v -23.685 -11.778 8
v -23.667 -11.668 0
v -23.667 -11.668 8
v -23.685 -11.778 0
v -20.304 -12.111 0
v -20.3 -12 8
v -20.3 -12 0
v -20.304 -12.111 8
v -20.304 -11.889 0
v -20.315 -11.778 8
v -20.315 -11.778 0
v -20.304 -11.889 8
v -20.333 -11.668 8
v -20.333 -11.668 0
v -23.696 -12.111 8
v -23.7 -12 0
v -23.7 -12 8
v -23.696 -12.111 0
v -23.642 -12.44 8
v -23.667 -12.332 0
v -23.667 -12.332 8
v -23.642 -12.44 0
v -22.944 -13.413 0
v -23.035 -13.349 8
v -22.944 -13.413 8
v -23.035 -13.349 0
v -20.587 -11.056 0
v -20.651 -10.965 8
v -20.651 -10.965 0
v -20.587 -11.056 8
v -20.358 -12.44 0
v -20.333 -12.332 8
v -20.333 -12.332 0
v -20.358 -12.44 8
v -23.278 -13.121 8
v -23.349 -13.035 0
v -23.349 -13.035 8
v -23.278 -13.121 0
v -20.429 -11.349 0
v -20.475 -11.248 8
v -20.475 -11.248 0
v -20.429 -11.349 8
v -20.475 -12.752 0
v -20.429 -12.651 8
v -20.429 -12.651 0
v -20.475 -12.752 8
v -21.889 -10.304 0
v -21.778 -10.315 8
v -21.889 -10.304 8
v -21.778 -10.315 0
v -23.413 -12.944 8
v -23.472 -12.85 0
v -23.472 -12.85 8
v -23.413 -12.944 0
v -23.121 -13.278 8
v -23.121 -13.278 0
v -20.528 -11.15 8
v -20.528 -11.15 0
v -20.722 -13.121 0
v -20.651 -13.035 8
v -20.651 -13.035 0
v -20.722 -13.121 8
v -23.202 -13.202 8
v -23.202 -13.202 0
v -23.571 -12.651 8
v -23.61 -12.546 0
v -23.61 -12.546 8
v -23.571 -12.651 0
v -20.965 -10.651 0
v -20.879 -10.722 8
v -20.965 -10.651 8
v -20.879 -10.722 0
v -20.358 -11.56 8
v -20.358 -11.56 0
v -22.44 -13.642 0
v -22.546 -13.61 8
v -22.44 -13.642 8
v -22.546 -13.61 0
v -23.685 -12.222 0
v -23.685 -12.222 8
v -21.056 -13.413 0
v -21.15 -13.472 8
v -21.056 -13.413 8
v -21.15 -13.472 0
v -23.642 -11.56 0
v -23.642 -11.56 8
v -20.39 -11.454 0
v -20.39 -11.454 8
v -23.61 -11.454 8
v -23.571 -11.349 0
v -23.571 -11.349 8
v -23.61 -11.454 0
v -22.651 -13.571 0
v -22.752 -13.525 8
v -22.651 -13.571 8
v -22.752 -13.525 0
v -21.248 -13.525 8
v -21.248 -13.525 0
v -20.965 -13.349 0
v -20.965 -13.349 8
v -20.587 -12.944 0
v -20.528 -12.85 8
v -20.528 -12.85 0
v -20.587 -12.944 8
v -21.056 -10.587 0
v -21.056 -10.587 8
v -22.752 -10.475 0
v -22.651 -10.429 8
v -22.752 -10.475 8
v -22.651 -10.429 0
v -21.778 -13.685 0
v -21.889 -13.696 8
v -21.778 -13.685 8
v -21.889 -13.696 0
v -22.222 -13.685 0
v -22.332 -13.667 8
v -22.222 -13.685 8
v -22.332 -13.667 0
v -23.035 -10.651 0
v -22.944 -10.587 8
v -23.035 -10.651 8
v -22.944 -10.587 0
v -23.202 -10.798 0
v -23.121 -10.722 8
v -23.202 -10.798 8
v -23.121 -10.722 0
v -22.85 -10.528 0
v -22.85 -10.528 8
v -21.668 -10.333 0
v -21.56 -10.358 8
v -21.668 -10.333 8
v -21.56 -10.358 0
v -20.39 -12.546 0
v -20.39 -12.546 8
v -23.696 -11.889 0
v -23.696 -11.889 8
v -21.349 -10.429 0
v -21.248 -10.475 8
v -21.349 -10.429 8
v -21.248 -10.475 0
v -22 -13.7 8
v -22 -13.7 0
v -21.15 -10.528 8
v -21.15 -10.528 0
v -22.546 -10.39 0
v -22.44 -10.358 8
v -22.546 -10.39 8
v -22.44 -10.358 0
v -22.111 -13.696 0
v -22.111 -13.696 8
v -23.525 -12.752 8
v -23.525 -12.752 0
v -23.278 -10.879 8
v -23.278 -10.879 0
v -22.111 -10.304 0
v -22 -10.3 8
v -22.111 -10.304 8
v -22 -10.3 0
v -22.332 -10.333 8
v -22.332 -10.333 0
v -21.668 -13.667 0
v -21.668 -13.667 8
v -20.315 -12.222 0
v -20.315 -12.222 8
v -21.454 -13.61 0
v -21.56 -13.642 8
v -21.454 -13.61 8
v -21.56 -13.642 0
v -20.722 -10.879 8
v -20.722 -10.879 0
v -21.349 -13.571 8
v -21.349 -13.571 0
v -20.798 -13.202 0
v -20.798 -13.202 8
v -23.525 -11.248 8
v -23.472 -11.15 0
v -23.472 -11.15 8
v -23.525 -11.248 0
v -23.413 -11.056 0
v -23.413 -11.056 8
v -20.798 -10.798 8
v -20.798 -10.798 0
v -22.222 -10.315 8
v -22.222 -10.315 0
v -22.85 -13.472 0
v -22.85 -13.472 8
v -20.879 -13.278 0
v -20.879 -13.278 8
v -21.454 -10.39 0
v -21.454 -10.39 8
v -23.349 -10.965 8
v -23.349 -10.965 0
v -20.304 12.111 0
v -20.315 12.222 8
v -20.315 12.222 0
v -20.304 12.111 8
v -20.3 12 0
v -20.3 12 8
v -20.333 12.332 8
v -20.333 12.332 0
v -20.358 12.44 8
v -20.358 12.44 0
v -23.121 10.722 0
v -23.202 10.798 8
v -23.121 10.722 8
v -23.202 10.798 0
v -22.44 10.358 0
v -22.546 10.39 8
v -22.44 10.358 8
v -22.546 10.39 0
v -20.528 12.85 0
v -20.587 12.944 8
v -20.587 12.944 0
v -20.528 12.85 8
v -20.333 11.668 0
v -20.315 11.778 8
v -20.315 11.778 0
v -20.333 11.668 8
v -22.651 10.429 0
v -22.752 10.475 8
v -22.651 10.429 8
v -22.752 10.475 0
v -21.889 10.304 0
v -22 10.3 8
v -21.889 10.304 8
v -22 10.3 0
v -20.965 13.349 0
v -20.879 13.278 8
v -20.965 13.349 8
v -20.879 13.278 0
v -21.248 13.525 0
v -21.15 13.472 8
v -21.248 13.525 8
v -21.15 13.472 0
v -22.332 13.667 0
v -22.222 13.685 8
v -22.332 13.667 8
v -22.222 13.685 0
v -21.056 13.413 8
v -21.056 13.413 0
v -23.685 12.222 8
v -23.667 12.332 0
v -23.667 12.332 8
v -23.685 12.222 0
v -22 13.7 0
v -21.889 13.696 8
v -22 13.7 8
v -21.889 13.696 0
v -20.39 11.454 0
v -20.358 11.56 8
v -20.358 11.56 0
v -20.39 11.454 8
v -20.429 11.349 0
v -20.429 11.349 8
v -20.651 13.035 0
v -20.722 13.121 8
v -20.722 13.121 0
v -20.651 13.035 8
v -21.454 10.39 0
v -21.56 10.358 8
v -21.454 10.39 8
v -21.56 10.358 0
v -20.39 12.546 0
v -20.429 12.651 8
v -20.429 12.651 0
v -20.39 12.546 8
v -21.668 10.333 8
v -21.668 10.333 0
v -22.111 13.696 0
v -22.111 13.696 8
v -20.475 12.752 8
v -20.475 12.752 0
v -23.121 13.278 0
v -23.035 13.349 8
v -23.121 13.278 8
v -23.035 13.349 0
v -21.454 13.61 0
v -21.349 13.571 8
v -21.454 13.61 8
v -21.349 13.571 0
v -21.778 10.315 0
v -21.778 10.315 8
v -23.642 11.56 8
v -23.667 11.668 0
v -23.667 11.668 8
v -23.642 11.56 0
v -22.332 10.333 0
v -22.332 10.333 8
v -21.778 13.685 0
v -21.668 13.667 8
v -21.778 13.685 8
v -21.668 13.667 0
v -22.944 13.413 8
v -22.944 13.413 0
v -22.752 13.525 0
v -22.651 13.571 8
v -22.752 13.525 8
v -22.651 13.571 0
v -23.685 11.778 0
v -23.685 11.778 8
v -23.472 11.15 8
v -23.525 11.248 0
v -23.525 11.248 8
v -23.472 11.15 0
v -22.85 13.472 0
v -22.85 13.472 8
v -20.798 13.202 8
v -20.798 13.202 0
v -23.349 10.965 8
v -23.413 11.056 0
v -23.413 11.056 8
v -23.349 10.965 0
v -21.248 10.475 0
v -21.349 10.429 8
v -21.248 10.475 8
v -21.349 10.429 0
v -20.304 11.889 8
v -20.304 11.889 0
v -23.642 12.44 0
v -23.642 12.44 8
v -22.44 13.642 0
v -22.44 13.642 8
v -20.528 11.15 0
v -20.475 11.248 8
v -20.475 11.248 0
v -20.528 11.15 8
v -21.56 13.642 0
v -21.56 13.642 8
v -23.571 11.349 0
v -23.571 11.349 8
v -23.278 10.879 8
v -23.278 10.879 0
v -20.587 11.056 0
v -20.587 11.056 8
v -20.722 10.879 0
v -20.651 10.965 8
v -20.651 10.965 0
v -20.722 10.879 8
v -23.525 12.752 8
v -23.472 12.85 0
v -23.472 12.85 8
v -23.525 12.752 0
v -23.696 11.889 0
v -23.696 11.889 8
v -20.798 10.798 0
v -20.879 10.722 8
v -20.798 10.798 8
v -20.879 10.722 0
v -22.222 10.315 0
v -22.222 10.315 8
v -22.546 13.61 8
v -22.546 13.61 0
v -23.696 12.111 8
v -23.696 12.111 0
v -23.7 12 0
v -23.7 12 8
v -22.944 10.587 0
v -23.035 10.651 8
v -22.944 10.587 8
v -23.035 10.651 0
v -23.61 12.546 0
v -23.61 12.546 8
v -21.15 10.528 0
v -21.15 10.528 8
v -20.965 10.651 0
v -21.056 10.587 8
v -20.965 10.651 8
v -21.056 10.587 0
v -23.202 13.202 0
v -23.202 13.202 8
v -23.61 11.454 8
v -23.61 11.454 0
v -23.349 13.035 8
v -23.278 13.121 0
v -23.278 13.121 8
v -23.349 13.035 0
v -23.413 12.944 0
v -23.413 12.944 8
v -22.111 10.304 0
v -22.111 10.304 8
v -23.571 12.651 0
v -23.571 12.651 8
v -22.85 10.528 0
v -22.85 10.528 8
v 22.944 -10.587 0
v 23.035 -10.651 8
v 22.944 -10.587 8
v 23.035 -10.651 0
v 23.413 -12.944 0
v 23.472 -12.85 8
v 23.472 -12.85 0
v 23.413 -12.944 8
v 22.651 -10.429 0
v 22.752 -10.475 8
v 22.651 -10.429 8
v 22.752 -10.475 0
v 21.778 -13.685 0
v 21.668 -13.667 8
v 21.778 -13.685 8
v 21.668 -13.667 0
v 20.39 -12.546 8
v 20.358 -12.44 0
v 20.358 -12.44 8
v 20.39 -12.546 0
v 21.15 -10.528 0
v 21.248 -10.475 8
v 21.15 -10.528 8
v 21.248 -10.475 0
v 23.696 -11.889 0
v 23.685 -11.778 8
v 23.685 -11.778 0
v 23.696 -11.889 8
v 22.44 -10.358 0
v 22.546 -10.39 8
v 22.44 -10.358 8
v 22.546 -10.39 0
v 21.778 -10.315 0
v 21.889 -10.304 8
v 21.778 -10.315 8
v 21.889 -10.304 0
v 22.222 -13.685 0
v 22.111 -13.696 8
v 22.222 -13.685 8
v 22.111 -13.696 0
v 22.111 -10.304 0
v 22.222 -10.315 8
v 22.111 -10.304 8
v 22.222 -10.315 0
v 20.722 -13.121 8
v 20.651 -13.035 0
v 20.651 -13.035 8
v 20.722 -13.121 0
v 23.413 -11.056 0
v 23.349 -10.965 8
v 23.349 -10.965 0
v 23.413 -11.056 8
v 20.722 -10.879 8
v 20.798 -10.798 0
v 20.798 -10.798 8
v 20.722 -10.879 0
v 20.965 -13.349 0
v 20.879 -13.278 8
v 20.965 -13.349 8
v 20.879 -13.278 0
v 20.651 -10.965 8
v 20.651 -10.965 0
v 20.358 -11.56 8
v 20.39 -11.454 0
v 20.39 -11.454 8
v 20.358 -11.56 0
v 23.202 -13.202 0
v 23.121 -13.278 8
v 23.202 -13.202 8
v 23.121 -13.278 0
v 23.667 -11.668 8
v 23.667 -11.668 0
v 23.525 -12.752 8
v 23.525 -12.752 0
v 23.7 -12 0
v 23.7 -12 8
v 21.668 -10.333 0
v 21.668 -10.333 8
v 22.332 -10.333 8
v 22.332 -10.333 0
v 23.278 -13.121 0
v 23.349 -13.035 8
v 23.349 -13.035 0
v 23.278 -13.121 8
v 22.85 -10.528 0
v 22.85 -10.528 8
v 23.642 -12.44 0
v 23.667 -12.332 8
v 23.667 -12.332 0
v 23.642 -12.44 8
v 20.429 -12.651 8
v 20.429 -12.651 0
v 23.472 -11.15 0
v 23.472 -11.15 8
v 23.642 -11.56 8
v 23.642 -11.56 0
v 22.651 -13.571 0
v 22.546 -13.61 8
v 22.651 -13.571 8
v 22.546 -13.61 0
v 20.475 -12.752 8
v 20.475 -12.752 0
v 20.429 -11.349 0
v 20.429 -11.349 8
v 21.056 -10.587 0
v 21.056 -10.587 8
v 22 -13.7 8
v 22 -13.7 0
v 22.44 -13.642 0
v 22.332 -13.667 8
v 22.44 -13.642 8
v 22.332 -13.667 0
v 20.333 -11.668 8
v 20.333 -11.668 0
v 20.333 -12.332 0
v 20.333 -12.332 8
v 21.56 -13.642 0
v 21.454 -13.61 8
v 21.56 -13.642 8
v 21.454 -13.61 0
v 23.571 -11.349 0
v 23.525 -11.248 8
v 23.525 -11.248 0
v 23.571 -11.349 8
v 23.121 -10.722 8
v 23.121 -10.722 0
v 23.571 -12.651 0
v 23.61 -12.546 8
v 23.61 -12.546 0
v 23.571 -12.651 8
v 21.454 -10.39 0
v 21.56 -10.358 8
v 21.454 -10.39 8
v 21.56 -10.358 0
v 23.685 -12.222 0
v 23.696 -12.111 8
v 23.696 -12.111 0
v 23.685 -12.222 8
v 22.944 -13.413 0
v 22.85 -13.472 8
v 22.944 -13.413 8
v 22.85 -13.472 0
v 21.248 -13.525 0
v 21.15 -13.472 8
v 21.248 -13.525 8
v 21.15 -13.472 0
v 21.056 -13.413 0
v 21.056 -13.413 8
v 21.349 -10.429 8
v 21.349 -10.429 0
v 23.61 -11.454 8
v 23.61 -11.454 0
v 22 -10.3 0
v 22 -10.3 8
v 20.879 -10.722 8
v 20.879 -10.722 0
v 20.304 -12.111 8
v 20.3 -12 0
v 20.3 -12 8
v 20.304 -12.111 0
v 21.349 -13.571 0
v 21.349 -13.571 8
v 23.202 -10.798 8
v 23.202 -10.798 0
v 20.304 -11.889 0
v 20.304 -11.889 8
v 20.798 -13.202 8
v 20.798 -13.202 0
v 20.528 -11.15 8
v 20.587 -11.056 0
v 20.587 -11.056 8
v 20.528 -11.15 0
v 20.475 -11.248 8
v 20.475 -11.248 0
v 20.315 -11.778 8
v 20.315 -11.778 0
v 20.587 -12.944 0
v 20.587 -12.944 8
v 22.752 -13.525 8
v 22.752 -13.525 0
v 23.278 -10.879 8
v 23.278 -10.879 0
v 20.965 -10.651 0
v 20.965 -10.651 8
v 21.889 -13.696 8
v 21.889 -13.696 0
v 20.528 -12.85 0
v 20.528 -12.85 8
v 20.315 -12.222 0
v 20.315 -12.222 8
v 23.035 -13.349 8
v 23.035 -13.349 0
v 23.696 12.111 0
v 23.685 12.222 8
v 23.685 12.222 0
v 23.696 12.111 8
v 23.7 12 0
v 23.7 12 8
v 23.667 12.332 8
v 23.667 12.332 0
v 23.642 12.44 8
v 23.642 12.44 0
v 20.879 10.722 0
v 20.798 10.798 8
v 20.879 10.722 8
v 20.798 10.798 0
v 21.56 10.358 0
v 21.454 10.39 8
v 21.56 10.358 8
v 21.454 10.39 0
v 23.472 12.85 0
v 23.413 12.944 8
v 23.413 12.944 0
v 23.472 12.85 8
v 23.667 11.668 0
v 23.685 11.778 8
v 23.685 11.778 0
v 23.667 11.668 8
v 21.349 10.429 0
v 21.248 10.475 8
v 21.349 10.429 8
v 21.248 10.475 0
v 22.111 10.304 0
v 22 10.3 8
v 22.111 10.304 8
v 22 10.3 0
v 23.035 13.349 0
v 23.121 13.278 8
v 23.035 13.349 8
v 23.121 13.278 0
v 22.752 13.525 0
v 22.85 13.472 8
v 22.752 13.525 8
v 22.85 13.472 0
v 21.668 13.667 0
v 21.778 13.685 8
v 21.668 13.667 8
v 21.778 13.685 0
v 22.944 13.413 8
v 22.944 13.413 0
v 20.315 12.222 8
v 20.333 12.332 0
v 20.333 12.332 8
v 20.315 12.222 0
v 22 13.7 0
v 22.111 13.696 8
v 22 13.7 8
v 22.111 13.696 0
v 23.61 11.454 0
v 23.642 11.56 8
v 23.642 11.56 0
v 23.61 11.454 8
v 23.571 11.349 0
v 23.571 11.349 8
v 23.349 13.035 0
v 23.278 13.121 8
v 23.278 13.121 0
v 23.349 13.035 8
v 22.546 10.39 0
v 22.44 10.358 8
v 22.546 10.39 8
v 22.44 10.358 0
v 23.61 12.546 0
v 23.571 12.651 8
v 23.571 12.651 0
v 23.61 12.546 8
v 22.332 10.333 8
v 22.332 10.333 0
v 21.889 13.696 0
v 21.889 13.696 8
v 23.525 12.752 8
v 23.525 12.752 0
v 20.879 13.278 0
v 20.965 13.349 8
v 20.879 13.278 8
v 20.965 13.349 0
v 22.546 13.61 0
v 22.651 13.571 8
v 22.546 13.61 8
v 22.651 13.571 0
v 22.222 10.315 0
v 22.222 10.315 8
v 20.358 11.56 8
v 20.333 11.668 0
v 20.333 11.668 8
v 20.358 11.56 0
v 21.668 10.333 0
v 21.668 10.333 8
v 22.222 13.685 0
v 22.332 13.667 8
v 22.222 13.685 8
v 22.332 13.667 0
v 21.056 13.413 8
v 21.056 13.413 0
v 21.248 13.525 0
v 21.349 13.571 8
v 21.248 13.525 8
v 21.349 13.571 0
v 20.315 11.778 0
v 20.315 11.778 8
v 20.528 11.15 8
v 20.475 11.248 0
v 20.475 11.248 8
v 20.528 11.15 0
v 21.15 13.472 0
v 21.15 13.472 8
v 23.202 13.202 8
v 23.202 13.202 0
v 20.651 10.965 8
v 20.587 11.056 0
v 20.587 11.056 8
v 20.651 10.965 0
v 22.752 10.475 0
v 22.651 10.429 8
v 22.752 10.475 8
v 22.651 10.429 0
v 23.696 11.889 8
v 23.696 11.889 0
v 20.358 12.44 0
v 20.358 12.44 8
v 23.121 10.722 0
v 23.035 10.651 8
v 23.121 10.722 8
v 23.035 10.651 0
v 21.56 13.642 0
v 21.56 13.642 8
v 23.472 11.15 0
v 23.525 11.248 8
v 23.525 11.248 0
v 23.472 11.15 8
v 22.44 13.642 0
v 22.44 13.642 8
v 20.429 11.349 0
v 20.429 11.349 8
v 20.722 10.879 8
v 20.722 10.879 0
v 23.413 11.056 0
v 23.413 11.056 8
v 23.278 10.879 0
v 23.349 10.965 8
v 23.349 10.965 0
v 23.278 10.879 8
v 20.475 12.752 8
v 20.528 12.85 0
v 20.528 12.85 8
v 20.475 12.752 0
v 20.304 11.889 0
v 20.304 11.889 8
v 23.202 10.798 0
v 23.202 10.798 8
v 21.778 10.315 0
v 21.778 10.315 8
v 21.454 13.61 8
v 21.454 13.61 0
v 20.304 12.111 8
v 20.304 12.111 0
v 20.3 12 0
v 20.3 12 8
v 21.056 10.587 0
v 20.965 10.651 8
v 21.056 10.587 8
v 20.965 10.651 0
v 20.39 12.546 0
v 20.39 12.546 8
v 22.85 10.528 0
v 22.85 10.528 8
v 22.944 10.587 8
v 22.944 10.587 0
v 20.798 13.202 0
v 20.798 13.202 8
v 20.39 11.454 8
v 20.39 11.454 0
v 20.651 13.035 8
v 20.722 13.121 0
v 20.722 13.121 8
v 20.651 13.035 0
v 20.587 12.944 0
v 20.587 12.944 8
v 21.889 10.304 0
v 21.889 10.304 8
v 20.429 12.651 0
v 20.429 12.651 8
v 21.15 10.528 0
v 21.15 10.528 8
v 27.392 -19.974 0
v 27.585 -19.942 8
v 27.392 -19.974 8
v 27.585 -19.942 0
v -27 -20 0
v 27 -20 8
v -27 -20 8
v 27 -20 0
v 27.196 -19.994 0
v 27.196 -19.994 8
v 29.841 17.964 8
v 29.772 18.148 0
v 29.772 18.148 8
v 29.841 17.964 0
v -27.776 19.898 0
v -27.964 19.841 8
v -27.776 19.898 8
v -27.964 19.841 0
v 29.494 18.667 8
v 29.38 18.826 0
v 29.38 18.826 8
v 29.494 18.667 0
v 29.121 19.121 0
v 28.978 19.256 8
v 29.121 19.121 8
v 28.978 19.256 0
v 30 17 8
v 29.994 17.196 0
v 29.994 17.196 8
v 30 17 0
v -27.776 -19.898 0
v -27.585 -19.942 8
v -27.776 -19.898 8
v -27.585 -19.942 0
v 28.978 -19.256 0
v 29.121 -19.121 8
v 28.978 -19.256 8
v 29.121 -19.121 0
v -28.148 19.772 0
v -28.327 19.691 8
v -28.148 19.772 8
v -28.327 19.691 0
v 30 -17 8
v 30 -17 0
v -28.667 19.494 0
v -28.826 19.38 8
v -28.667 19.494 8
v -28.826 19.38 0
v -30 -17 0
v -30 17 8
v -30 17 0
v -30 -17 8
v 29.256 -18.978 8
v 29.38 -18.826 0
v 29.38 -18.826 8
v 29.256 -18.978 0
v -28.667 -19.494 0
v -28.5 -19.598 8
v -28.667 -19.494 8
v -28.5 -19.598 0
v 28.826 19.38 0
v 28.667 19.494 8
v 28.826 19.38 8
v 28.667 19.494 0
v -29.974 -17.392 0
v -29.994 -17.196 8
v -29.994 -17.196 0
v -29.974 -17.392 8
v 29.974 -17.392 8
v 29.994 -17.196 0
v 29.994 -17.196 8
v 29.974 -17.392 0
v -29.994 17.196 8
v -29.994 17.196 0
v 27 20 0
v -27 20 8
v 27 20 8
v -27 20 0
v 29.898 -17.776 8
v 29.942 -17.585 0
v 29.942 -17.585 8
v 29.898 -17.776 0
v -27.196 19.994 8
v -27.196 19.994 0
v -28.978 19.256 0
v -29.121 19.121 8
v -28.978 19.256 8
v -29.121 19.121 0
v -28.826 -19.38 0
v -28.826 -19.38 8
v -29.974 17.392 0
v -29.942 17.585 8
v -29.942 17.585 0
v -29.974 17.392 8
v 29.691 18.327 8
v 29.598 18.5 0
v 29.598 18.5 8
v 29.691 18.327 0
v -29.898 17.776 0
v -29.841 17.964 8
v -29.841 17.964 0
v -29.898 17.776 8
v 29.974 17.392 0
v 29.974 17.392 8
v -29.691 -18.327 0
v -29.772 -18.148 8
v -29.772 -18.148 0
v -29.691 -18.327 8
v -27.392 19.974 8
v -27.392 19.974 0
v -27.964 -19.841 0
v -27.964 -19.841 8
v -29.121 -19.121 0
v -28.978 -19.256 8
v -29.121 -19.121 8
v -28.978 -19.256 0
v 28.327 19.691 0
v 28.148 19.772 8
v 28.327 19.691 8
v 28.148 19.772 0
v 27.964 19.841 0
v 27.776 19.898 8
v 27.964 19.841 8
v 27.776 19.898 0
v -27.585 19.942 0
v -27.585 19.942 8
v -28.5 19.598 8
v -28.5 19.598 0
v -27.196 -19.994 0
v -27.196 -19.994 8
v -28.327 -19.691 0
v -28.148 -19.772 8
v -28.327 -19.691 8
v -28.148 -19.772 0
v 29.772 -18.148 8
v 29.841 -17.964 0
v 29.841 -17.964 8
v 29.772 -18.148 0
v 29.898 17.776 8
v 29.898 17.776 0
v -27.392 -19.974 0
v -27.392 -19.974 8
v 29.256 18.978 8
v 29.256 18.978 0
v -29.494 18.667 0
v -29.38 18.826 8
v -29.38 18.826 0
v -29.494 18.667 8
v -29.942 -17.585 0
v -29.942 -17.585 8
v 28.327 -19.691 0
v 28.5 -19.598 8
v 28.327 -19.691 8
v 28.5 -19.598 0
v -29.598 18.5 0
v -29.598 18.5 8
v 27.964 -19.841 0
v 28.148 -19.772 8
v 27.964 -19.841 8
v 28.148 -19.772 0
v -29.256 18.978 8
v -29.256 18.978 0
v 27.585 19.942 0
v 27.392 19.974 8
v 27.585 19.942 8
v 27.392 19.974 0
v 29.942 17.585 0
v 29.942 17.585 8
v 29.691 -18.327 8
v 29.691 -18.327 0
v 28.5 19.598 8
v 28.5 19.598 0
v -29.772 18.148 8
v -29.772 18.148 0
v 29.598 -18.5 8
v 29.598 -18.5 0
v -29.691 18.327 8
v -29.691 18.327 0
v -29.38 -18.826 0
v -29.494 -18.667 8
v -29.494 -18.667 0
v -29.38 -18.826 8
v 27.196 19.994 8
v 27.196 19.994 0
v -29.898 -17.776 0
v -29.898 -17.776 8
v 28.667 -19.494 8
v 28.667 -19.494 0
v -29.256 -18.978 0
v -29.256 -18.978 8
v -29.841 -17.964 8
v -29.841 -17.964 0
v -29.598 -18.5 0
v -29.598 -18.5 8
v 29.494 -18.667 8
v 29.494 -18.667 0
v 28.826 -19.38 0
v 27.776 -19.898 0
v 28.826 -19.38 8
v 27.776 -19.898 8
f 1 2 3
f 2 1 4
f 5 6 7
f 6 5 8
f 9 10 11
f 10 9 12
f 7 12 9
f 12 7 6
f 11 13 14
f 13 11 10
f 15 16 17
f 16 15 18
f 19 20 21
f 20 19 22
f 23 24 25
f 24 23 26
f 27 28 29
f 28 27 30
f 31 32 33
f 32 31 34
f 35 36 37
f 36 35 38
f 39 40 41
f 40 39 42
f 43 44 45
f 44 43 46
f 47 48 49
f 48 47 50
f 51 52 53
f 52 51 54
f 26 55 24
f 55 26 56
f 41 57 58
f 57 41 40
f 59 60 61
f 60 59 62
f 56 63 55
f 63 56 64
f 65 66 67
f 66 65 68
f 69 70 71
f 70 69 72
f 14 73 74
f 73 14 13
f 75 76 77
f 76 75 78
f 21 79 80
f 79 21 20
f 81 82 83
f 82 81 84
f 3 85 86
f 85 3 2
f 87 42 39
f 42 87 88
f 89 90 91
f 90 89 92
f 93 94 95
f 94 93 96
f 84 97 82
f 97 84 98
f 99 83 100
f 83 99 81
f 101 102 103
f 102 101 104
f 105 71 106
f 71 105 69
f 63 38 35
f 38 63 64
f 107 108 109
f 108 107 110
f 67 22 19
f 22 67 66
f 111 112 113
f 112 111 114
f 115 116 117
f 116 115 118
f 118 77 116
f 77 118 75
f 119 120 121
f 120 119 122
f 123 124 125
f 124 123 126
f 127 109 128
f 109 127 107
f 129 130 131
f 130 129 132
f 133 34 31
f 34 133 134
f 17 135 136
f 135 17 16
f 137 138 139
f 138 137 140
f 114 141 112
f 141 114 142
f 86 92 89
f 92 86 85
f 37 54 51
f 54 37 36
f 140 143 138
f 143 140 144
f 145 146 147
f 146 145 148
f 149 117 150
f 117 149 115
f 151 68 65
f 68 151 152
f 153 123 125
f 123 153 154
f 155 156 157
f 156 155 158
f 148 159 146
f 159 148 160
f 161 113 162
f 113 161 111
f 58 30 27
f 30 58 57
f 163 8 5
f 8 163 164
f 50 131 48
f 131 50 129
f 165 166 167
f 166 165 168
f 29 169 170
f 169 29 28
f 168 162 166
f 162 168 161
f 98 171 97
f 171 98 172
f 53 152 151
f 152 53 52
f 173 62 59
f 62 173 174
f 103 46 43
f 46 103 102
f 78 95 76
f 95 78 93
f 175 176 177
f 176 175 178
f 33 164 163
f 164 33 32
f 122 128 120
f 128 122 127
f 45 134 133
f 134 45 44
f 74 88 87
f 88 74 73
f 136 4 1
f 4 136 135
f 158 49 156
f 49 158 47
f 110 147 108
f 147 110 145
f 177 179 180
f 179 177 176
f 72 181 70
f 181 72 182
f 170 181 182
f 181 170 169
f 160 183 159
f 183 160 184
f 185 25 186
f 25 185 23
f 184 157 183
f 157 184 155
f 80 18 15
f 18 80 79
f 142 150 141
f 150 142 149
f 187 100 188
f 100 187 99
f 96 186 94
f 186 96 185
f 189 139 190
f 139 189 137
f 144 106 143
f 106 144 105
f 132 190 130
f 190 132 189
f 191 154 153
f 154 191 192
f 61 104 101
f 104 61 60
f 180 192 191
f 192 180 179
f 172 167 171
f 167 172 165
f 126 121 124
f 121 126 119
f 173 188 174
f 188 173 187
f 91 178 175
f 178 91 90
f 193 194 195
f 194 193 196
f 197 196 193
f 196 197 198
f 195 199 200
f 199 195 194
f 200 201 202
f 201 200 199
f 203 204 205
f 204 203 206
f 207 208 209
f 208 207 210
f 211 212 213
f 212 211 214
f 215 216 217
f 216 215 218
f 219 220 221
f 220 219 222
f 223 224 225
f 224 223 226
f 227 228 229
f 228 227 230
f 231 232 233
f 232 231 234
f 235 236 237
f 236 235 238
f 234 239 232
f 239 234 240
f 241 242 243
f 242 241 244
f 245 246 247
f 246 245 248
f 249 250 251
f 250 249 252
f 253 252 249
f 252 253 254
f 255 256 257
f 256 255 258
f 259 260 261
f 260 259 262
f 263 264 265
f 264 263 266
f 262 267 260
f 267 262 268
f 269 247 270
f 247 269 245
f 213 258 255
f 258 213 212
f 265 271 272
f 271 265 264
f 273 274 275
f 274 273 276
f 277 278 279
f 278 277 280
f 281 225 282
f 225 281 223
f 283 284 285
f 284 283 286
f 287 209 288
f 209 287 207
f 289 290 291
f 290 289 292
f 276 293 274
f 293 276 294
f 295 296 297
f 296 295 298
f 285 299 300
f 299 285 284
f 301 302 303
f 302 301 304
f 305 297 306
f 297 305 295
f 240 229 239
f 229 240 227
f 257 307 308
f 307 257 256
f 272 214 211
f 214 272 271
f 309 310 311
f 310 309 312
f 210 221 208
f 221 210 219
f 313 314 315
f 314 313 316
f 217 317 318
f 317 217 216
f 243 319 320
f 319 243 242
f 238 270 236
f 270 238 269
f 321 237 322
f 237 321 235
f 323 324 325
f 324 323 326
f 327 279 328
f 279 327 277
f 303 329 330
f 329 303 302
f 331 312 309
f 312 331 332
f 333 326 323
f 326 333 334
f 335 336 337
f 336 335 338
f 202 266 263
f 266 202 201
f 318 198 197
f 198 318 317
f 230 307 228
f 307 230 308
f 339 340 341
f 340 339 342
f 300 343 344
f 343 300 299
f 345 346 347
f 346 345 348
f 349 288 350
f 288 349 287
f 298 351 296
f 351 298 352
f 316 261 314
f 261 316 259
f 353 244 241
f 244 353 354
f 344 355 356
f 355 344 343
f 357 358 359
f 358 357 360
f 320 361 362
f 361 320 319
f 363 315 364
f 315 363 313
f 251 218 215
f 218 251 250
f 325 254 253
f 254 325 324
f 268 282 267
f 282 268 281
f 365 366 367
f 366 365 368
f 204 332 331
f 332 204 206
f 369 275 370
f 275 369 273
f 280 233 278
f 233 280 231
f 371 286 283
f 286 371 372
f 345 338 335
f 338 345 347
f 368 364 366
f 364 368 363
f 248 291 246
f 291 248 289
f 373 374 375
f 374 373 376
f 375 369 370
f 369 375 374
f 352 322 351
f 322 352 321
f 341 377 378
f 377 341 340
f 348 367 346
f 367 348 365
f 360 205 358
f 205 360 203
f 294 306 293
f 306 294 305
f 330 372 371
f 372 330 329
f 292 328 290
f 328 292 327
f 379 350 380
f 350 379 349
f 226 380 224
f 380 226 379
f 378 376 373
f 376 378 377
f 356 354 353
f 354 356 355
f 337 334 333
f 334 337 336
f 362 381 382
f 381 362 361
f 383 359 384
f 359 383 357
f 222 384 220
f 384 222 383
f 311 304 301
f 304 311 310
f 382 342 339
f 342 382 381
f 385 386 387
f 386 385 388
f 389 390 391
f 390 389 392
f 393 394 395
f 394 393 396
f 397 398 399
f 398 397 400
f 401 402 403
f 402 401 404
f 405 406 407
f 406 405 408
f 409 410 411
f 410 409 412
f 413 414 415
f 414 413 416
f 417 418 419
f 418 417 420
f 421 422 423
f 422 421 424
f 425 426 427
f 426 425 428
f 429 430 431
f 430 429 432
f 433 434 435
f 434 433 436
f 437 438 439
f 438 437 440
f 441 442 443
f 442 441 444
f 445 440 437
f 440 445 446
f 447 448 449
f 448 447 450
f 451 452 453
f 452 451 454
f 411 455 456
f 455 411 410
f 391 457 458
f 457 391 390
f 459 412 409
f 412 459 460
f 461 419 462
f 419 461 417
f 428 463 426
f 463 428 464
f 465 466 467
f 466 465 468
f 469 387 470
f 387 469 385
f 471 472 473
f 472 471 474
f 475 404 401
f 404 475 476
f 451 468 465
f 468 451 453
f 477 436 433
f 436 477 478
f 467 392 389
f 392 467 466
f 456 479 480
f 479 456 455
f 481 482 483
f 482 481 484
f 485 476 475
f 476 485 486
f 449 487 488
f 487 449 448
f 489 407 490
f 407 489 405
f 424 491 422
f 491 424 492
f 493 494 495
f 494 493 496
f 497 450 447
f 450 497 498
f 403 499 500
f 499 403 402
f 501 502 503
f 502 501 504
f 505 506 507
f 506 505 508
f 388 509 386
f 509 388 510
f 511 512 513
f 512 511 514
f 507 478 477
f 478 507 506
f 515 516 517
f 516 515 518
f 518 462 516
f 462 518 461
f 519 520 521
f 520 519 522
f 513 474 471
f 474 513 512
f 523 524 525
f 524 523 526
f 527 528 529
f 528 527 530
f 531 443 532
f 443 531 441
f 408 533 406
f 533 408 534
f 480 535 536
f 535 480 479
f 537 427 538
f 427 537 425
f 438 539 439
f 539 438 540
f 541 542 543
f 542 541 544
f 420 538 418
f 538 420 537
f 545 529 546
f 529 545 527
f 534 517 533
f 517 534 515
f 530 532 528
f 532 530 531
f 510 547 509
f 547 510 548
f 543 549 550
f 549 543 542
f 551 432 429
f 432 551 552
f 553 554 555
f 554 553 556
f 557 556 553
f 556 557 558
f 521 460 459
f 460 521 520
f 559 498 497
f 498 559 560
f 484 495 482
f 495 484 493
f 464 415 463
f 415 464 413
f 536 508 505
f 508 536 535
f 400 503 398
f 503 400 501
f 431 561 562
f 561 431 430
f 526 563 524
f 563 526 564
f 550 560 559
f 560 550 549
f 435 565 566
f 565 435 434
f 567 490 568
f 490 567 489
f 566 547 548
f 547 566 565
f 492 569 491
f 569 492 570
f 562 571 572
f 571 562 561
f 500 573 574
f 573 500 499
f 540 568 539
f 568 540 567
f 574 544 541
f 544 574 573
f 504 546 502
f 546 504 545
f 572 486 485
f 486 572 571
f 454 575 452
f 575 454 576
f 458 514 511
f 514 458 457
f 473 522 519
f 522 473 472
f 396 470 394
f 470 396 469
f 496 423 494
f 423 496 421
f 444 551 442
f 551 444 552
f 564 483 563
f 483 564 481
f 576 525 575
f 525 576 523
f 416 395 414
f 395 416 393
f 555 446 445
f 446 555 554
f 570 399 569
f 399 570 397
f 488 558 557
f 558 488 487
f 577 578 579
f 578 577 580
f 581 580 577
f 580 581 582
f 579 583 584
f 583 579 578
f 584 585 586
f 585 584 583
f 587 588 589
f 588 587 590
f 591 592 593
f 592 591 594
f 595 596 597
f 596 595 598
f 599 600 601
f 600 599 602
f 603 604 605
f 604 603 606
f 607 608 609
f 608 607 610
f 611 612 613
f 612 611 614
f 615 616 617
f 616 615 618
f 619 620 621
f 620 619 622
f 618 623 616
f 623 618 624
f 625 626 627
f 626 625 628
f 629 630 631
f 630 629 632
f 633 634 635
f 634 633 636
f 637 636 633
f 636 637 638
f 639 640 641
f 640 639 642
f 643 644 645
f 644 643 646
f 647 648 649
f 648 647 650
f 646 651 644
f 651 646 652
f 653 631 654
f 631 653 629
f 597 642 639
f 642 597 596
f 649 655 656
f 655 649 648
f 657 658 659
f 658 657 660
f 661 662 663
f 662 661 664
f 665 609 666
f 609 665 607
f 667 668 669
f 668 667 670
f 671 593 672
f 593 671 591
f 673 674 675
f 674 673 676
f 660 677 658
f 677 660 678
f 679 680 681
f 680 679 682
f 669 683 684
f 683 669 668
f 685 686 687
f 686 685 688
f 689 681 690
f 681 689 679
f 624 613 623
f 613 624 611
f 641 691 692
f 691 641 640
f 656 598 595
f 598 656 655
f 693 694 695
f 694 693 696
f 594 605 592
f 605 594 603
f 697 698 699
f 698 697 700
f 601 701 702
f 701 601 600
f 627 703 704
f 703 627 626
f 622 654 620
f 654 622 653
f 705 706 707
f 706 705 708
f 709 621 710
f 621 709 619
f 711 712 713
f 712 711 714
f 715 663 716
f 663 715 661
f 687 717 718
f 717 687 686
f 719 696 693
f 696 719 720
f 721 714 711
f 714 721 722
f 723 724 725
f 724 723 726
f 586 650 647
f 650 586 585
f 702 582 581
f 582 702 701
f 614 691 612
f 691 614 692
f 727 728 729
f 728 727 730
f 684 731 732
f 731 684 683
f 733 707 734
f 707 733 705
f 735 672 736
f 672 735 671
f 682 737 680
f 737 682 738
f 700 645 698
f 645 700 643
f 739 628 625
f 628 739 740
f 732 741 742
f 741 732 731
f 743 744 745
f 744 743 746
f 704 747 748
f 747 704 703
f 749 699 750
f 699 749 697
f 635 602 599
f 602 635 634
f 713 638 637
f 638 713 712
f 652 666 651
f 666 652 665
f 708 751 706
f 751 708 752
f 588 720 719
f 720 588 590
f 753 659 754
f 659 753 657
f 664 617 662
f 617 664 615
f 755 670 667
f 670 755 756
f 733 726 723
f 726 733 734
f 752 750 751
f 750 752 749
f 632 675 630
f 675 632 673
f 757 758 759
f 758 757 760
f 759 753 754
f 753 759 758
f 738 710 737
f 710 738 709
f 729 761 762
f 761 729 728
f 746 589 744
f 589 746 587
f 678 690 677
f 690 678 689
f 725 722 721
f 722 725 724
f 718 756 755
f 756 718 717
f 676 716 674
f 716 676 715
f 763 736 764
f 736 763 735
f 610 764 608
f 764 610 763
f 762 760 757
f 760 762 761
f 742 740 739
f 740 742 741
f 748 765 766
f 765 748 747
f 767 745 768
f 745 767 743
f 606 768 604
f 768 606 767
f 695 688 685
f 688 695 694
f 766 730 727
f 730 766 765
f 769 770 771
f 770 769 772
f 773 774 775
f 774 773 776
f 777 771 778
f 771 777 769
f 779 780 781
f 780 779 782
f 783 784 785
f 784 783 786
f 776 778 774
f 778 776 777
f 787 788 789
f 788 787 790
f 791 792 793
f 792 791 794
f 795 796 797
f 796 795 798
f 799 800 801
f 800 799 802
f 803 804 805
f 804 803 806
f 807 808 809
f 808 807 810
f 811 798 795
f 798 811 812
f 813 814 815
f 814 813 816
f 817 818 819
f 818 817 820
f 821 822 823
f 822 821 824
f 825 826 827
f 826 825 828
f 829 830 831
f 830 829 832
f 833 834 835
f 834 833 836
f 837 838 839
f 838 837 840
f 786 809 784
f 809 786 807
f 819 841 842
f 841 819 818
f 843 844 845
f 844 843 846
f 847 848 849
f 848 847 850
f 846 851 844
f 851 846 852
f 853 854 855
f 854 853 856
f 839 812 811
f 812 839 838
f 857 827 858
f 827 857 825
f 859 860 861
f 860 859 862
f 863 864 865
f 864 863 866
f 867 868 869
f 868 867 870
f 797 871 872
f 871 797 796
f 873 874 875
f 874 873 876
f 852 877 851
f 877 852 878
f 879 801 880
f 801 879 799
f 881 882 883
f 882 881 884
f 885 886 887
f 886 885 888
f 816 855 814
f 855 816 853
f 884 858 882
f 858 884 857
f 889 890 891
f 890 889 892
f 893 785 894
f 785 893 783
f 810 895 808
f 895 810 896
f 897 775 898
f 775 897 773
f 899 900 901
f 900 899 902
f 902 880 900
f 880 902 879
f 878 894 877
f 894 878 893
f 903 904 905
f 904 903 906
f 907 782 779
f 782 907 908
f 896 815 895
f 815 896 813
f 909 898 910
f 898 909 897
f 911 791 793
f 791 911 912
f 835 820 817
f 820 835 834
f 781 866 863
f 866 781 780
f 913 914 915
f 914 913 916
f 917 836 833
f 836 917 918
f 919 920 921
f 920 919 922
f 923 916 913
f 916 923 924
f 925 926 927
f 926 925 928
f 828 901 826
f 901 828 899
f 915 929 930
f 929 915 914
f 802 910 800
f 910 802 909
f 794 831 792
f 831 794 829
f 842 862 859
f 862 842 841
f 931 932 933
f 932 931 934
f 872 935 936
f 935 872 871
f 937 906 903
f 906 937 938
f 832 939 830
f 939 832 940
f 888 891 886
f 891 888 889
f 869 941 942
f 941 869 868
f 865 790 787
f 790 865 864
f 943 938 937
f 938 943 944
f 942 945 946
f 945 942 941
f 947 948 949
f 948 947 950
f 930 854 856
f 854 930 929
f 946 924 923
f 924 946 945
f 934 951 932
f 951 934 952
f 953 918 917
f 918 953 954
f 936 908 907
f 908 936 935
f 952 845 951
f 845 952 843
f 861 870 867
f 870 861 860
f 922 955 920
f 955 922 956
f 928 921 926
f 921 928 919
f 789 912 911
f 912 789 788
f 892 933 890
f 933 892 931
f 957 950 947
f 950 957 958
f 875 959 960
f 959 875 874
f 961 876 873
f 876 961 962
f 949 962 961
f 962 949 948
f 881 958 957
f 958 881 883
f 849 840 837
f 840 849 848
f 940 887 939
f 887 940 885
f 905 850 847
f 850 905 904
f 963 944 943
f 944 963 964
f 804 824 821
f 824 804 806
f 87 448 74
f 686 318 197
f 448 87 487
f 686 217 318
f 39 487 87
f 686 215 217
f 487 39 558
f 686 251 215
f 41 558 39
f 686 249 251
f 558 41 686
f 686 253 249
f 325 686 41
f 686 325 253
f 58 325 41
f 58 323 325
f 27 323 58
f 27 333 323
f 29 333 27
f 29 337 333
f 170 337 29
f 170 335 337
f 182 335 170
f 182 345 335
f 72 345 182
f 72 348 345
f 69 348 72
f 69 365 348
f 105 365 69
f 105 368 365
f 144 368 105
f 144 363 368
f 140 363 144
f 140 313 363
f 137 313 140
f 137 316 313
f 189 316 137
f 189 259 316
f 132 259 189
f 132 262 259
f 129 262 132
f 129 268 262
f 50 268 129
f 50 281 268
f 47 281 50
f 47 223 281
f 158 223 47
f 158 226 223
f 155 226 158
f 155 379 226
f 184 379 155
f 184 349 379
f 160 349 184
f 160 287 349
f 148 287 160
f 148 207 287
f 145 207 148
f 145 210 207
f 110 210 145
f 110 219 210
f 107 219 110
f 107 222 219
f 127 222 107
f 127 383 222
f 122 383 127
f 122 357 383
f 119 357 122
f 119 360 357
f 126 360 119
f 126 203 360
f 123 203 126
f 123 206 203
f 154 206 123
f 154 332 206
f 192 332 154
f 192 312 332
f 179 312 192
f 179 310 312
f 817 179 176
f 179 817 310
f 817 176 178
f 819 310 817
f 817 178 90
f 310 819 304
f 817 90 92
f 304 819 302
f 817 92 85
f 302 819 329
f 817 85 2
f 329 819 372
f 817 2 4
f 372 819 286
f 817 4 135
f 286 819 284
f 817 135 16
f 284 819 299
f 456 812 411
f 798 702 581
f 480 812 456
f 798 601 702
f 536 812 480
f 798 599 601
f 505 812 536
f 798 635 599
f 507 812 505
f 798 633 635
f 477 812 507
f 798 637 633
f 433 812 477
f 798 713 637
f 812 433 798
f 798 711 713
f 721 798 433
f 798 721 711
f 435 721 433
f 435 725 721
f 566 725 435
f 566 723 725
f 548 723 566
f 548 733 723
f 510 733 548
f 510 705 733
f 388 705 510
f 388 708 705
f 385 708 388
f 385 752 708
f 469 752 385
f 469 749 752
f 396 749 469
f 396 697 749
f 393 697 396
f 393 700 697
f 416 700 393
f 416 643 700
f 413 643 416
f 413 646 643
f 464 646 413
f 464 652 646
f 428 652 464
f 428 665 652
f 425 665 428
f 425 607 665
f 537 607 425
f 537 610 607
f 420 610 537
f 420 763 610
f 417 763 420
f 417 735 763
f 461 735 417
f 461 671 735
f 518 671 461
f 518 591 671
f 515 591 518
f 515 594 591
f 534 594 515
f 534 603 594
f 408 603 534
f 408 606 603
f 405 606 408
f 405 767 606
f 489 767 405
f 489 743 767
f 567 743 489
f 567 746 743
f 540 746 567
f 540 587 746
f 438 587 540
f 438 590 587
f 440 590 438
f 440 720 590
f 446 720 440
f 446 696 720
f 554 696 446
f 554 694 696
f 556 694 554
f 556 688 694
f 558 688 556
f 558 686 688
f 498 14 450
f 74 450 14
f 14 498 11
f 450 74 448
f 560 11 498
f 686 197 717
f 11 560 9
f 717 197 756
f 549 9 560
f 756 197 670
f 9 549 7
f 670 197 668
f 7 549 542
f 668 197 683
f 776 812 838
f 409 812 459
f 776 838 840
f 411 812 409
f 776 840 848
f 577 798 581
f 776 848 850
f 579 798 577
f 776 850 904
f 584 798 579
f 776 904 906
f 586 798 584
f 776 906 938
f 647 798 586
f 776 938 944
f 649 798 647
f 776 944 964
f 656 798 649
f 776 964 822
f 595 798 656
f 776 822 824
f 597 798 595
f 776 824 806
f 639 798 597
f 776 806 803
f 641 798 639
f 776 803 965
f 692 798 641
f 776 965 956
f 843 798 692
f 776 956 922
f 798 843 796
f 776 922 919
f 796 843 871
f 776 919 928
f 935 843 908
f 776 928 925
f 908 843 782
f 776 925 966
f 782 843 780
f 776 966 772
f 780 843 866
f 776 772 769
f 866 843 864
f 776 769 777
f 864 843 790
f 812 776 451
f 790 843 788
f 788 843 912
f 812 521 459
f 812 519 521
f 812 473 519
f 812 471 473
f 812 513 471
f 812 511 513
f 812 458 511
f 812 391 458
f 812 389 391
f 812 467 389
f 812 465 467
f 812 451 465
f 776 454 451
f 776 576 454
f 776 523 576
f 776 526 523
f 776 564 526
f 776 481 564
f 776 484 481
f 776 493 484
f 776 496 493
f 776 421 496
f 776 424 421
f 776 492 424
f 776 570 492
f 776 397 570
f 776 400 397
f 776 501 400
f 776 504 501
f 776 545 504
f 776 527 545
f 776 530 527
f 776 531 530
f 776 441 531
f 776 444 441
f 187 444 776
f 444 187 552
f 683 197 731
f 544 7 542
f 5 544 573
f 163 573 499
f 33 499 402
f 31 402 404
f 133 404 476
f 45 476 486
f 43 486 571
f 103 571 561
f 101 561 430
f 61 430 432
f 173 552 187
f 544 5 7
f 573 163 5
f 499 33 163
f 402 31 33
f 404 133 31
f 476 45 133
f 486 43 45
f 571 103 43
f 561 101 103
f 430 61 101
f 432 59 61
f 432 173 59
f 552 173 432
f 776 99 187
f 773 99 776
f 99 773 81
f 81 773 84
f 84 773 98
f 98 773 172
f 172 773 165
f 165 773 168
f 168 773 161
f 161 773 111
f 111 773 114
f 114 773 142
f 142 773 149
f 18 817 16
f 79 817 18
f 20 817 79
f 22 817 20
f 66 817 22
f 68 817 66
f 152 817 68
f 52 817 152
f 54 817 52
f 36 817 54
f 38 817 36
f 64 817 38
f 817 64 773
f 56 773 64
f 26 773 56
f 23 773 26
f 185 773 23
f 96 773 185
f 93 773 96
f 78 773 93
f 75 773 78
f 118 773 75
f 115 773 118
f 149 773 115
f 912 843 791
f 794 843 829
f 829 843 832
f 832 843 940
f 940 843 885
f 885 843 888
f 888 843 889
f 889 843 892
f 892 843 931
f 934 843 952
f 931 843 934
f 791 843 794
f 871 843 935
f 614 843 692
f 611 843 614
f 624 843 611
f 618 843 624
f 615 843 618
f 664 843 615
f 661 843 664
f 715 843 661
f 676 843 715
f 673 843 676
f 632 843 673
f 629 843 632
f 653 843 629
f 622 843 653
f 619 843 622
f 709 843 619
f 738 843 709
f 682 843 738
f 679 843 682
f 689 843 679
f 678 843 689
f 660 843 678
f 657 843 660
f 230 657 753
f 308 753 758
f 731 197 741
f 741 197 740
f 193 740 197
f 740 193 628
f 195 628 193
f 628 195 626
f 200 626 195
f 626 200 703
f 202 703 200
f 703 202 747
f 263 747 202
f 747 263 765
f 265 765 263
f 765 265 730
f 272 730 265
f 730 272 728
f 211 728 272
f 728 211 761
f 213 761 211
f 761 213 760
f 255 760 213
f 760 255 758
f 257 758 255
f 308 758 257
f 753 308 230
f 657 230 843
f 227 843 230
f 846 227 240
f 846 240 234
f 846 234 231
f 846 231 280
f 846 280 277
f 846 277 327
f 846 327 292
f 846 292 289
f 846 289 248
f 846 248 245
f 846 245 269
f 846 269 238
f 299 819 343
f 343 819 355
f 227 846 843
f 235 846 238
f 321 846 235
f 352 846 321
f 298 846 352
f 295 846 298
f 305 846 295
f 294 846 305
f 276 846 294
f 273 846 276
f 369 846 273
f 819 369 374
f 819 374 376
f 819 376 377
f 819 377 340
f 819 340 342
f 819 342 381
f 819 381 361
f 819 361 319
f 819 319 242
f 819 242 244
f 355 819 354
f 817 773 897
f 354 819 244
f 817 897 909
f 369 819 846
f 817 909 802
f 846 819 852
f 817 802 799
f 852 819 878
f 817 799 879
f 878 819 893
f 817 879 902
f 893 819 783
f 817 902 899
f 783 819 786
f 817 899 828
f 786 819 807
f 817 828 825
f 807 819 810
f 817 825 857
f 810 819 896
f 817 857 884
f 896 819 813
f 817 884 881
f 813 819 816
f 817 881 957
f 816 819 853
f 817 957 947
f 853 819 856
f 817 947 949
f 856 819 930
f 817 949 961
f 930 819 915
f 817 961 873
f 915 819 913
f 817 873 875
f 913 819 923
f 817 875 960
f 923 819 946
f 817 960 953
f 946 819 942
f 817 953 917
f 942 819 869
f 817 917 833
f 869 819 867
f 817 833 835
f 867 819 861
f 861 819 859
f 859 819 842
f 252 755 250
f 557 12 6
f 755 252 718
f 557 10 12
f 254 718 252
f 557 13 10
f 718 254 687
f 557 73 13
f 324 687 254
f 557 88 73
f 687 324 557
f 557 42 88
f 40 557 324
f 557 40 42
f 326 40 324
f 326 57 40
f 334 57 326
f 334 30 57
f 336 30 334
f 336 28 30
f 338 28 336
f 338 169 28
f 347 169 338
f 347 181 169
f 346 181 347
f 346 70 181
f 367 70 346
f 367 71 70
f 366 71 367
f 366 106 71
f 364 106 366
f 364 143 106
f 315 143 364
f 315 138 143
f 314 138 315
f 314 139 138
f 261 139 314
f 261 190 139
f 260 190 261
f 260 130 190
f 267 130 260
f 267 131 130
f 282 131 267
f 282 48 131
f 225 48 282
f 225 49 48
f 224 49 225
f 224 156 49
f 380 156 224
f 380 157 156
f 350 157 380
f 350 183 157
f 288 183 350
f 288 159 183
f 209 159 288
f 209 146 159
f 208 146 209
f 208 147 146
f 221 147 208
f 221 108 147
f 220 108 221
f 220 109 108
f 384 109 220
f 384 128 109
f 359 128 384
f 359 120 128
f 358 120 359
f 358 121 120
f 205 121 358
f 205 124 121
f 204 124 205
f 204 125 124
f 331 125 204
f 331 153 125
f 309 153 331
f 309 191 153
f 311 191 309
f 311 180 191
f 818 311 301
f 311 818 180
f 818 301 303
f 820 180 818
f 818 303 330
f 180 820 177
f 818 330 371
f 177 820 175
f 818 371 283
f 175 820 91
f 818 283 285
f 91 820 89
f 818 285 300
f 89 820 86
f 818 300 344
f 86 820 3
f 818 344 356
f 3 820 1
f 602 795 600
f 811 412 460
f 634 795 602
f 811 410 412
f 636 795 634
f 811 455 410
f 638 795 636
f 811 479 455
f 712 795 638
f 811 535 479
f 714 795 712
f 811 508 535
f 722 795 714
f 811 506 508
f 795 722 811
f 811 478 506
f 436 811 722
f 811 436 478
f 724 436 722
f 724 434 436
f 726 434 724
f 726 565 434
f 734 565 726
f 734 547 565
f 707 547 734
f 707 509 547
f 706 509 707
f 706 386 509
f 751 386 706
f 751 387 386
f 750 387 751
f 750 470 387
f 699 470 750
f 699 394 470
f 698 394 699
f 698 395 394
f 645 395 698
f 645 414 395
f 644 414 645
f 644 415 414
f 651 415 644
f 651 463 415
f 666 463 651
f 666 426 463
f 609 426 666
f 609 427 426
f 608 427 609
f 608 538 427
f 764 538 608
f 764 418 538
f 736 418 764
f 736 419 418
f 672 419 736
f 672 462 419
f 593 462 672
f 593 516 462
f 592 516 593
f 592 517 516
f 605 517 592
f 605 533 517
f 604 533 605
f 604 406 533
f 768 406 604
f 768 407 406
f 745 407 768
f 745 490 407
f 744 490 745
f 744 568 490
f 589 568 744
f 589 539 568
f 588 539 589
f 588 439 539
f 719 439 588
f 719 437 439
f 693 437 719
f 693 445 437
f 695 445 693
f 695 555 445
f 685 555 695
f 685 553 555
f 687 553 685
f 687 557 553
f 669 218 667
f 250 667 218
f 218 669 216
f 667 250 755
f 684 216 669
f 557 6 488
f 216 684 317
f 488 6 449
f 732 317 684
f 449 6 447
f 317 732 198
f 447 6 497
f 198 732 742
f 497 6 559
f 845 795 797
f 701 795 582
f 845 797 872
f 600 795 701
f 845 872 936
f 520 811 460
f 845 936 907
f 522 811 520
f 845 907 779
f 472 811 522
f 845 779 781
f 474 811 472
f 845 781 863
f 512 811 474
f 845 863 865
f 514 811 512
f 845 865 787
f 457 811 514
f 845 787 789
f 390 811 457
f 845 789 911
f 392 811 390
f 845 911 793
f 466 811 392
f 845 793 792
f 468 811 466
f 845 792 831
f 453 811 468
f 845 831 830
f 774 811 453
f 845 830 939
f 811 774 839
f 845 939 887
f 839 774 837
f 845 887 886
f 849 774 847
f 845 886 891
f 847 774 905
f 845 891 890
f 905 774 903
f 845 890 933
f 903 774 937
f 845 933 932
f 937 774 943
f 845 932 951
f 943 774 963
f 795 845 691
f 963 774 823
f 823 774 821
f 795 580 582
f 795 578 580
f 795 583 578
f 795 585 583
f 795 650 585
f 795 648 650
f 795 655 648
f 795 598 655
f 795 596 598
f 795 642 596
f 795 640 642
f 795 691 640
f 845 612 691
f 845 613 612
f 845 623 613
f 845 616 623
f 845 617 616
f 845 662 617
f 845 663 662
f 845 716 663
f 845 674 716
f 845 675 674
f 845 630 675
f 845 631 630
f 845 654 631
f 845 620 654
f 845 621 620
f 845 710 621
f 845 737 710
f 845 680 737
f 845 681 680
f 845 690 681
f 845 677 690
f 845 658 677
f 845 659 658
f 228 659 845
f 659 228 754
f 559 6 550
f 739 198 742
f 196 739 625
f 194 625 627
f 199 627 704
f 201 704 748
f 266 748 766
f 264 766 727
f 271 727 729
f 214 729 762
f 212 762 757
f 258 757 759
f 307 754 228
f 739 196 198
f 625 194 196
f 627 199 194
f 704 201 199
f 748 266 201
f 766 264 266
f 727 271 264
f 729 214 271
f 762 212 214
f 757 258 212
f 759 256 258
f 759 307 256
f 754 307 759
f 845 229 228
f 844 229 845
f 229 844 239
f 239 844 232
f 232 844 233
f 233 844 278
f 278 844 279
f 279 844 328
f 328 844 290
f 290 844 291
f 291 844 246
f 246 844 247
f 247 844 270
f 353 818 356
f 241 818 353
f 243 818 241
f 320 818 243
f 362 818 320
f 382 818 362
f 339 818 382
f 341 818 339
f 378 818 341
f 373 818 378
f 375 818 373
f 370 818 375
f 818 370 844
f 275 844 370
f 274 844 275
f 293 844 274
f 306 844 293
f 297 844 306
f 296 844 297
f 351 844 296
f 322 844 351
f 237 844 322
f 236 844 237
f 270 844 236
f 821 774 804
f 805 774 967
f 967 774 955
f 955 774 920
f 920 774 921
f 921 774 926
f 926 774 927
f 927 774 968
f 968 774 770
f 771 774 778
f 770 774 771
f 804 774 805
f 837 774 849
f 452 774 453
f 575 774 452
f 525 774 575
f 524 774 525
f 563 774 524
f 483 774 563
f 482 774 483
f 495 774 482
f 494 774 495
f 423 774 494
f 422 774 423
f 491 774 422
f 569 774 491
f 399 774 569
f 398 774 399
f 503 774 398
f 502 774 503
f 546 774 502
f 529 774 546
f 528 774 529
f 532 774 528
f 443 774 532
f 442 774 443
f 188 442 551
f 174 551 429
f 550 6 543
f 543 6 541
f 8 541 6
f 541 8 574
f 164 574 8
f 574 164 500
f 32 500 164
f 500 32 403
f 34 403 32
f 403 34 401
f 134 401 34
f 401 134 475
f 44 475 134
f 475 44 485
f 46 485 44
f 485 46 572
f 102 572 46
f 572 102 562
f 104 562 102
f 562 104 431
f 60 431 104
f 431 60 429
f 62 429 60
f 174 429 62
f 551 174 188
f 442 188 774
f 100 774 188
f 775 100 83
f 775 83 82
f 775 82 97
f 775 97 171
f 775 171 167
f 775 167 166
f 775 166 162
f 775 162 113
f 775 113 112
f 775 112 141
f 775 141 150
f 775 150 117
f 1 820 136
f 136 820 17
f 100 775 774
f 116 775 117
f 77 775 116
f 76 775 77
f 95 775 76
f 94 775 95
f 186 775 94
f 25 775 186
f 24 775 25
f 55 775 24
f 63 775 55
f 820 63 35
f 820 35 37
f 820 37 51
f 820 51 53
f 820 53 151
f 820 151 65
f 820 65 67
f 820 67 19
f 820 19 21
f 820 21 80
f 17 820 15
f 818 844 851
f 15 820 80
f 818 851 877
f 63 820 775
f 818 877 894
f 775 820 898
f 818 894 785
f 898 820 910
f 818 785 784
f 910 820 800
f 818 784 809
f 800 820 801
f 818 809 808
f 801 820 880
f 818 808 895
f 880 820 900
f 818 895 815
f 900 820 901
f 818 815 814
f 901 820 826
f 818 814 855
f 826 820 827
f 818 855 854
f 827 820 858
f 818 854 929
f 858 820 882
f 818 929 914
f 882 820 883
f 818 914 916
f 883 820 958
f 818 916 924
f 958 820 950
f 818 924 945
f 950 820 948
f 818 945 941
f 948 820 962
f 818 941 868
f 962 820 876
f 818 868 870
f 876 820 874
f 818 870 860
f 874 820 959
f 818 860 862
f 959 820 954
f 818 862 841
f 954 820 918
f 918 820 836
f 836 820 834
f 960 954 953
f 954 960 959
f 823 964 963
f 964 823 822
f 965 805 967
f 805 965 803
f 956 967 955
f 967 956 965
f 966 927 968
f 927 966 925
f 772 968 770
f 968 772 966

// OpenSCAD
// Parametric OpenSCAD starter for dimensioned FDM parts.
// Units: millimetres

/* [Primary dimensions] */
part_x = 60;
part_y = 40;
part_z = 8;
corner_r = 3;

/* [Functional features] */
hole_d = 3.4;
hole_edge_x = 8;
hole_edge_y = 8;

/* [Quality] */
preview_fn = 32;
render_fn = 96;
$fn = $preview ? preview_fn : render_fn;
eps = 0.01;

assert(part_x > 2 * corner_r, "part_x is too small for corner_r");
assert(part_y > 2 * corner_r, "part_y is too small for corner_r");
assert(hole_edge_x > hole_d / 2, "hole is too close to X edge");
assert(hole_edge_y > hole_d / 2, "hole is too close to Y edge");

module rounded_profile(size = [part_x, part_y], r = corner_r) {
    offset(r = r)
        square([size.x - 2 * r, size.y - 2 * r], center = true);
}

module primary_body() {
    linear_extrude(height = part_z)
        rounded_profile();
}

module additive_features() {
    // Add bosses, ribs, or locating features here.
}

module subtractive_features() {
    for (x = [-part_x / 2 + hole_edge_x, part_x / 2 - hole_edge_x])
        for (y = [-part_y / 2 + hole_edge_y, part_y / 2 - hole_edge_y])
            translate([x, y, -eps])
                cylinder(d = hole_d, h = part_z + 2 * eps);
}

difference() {
    union() {
        primary_body();
        additive_features();
    }
    subtractive_features();
}
